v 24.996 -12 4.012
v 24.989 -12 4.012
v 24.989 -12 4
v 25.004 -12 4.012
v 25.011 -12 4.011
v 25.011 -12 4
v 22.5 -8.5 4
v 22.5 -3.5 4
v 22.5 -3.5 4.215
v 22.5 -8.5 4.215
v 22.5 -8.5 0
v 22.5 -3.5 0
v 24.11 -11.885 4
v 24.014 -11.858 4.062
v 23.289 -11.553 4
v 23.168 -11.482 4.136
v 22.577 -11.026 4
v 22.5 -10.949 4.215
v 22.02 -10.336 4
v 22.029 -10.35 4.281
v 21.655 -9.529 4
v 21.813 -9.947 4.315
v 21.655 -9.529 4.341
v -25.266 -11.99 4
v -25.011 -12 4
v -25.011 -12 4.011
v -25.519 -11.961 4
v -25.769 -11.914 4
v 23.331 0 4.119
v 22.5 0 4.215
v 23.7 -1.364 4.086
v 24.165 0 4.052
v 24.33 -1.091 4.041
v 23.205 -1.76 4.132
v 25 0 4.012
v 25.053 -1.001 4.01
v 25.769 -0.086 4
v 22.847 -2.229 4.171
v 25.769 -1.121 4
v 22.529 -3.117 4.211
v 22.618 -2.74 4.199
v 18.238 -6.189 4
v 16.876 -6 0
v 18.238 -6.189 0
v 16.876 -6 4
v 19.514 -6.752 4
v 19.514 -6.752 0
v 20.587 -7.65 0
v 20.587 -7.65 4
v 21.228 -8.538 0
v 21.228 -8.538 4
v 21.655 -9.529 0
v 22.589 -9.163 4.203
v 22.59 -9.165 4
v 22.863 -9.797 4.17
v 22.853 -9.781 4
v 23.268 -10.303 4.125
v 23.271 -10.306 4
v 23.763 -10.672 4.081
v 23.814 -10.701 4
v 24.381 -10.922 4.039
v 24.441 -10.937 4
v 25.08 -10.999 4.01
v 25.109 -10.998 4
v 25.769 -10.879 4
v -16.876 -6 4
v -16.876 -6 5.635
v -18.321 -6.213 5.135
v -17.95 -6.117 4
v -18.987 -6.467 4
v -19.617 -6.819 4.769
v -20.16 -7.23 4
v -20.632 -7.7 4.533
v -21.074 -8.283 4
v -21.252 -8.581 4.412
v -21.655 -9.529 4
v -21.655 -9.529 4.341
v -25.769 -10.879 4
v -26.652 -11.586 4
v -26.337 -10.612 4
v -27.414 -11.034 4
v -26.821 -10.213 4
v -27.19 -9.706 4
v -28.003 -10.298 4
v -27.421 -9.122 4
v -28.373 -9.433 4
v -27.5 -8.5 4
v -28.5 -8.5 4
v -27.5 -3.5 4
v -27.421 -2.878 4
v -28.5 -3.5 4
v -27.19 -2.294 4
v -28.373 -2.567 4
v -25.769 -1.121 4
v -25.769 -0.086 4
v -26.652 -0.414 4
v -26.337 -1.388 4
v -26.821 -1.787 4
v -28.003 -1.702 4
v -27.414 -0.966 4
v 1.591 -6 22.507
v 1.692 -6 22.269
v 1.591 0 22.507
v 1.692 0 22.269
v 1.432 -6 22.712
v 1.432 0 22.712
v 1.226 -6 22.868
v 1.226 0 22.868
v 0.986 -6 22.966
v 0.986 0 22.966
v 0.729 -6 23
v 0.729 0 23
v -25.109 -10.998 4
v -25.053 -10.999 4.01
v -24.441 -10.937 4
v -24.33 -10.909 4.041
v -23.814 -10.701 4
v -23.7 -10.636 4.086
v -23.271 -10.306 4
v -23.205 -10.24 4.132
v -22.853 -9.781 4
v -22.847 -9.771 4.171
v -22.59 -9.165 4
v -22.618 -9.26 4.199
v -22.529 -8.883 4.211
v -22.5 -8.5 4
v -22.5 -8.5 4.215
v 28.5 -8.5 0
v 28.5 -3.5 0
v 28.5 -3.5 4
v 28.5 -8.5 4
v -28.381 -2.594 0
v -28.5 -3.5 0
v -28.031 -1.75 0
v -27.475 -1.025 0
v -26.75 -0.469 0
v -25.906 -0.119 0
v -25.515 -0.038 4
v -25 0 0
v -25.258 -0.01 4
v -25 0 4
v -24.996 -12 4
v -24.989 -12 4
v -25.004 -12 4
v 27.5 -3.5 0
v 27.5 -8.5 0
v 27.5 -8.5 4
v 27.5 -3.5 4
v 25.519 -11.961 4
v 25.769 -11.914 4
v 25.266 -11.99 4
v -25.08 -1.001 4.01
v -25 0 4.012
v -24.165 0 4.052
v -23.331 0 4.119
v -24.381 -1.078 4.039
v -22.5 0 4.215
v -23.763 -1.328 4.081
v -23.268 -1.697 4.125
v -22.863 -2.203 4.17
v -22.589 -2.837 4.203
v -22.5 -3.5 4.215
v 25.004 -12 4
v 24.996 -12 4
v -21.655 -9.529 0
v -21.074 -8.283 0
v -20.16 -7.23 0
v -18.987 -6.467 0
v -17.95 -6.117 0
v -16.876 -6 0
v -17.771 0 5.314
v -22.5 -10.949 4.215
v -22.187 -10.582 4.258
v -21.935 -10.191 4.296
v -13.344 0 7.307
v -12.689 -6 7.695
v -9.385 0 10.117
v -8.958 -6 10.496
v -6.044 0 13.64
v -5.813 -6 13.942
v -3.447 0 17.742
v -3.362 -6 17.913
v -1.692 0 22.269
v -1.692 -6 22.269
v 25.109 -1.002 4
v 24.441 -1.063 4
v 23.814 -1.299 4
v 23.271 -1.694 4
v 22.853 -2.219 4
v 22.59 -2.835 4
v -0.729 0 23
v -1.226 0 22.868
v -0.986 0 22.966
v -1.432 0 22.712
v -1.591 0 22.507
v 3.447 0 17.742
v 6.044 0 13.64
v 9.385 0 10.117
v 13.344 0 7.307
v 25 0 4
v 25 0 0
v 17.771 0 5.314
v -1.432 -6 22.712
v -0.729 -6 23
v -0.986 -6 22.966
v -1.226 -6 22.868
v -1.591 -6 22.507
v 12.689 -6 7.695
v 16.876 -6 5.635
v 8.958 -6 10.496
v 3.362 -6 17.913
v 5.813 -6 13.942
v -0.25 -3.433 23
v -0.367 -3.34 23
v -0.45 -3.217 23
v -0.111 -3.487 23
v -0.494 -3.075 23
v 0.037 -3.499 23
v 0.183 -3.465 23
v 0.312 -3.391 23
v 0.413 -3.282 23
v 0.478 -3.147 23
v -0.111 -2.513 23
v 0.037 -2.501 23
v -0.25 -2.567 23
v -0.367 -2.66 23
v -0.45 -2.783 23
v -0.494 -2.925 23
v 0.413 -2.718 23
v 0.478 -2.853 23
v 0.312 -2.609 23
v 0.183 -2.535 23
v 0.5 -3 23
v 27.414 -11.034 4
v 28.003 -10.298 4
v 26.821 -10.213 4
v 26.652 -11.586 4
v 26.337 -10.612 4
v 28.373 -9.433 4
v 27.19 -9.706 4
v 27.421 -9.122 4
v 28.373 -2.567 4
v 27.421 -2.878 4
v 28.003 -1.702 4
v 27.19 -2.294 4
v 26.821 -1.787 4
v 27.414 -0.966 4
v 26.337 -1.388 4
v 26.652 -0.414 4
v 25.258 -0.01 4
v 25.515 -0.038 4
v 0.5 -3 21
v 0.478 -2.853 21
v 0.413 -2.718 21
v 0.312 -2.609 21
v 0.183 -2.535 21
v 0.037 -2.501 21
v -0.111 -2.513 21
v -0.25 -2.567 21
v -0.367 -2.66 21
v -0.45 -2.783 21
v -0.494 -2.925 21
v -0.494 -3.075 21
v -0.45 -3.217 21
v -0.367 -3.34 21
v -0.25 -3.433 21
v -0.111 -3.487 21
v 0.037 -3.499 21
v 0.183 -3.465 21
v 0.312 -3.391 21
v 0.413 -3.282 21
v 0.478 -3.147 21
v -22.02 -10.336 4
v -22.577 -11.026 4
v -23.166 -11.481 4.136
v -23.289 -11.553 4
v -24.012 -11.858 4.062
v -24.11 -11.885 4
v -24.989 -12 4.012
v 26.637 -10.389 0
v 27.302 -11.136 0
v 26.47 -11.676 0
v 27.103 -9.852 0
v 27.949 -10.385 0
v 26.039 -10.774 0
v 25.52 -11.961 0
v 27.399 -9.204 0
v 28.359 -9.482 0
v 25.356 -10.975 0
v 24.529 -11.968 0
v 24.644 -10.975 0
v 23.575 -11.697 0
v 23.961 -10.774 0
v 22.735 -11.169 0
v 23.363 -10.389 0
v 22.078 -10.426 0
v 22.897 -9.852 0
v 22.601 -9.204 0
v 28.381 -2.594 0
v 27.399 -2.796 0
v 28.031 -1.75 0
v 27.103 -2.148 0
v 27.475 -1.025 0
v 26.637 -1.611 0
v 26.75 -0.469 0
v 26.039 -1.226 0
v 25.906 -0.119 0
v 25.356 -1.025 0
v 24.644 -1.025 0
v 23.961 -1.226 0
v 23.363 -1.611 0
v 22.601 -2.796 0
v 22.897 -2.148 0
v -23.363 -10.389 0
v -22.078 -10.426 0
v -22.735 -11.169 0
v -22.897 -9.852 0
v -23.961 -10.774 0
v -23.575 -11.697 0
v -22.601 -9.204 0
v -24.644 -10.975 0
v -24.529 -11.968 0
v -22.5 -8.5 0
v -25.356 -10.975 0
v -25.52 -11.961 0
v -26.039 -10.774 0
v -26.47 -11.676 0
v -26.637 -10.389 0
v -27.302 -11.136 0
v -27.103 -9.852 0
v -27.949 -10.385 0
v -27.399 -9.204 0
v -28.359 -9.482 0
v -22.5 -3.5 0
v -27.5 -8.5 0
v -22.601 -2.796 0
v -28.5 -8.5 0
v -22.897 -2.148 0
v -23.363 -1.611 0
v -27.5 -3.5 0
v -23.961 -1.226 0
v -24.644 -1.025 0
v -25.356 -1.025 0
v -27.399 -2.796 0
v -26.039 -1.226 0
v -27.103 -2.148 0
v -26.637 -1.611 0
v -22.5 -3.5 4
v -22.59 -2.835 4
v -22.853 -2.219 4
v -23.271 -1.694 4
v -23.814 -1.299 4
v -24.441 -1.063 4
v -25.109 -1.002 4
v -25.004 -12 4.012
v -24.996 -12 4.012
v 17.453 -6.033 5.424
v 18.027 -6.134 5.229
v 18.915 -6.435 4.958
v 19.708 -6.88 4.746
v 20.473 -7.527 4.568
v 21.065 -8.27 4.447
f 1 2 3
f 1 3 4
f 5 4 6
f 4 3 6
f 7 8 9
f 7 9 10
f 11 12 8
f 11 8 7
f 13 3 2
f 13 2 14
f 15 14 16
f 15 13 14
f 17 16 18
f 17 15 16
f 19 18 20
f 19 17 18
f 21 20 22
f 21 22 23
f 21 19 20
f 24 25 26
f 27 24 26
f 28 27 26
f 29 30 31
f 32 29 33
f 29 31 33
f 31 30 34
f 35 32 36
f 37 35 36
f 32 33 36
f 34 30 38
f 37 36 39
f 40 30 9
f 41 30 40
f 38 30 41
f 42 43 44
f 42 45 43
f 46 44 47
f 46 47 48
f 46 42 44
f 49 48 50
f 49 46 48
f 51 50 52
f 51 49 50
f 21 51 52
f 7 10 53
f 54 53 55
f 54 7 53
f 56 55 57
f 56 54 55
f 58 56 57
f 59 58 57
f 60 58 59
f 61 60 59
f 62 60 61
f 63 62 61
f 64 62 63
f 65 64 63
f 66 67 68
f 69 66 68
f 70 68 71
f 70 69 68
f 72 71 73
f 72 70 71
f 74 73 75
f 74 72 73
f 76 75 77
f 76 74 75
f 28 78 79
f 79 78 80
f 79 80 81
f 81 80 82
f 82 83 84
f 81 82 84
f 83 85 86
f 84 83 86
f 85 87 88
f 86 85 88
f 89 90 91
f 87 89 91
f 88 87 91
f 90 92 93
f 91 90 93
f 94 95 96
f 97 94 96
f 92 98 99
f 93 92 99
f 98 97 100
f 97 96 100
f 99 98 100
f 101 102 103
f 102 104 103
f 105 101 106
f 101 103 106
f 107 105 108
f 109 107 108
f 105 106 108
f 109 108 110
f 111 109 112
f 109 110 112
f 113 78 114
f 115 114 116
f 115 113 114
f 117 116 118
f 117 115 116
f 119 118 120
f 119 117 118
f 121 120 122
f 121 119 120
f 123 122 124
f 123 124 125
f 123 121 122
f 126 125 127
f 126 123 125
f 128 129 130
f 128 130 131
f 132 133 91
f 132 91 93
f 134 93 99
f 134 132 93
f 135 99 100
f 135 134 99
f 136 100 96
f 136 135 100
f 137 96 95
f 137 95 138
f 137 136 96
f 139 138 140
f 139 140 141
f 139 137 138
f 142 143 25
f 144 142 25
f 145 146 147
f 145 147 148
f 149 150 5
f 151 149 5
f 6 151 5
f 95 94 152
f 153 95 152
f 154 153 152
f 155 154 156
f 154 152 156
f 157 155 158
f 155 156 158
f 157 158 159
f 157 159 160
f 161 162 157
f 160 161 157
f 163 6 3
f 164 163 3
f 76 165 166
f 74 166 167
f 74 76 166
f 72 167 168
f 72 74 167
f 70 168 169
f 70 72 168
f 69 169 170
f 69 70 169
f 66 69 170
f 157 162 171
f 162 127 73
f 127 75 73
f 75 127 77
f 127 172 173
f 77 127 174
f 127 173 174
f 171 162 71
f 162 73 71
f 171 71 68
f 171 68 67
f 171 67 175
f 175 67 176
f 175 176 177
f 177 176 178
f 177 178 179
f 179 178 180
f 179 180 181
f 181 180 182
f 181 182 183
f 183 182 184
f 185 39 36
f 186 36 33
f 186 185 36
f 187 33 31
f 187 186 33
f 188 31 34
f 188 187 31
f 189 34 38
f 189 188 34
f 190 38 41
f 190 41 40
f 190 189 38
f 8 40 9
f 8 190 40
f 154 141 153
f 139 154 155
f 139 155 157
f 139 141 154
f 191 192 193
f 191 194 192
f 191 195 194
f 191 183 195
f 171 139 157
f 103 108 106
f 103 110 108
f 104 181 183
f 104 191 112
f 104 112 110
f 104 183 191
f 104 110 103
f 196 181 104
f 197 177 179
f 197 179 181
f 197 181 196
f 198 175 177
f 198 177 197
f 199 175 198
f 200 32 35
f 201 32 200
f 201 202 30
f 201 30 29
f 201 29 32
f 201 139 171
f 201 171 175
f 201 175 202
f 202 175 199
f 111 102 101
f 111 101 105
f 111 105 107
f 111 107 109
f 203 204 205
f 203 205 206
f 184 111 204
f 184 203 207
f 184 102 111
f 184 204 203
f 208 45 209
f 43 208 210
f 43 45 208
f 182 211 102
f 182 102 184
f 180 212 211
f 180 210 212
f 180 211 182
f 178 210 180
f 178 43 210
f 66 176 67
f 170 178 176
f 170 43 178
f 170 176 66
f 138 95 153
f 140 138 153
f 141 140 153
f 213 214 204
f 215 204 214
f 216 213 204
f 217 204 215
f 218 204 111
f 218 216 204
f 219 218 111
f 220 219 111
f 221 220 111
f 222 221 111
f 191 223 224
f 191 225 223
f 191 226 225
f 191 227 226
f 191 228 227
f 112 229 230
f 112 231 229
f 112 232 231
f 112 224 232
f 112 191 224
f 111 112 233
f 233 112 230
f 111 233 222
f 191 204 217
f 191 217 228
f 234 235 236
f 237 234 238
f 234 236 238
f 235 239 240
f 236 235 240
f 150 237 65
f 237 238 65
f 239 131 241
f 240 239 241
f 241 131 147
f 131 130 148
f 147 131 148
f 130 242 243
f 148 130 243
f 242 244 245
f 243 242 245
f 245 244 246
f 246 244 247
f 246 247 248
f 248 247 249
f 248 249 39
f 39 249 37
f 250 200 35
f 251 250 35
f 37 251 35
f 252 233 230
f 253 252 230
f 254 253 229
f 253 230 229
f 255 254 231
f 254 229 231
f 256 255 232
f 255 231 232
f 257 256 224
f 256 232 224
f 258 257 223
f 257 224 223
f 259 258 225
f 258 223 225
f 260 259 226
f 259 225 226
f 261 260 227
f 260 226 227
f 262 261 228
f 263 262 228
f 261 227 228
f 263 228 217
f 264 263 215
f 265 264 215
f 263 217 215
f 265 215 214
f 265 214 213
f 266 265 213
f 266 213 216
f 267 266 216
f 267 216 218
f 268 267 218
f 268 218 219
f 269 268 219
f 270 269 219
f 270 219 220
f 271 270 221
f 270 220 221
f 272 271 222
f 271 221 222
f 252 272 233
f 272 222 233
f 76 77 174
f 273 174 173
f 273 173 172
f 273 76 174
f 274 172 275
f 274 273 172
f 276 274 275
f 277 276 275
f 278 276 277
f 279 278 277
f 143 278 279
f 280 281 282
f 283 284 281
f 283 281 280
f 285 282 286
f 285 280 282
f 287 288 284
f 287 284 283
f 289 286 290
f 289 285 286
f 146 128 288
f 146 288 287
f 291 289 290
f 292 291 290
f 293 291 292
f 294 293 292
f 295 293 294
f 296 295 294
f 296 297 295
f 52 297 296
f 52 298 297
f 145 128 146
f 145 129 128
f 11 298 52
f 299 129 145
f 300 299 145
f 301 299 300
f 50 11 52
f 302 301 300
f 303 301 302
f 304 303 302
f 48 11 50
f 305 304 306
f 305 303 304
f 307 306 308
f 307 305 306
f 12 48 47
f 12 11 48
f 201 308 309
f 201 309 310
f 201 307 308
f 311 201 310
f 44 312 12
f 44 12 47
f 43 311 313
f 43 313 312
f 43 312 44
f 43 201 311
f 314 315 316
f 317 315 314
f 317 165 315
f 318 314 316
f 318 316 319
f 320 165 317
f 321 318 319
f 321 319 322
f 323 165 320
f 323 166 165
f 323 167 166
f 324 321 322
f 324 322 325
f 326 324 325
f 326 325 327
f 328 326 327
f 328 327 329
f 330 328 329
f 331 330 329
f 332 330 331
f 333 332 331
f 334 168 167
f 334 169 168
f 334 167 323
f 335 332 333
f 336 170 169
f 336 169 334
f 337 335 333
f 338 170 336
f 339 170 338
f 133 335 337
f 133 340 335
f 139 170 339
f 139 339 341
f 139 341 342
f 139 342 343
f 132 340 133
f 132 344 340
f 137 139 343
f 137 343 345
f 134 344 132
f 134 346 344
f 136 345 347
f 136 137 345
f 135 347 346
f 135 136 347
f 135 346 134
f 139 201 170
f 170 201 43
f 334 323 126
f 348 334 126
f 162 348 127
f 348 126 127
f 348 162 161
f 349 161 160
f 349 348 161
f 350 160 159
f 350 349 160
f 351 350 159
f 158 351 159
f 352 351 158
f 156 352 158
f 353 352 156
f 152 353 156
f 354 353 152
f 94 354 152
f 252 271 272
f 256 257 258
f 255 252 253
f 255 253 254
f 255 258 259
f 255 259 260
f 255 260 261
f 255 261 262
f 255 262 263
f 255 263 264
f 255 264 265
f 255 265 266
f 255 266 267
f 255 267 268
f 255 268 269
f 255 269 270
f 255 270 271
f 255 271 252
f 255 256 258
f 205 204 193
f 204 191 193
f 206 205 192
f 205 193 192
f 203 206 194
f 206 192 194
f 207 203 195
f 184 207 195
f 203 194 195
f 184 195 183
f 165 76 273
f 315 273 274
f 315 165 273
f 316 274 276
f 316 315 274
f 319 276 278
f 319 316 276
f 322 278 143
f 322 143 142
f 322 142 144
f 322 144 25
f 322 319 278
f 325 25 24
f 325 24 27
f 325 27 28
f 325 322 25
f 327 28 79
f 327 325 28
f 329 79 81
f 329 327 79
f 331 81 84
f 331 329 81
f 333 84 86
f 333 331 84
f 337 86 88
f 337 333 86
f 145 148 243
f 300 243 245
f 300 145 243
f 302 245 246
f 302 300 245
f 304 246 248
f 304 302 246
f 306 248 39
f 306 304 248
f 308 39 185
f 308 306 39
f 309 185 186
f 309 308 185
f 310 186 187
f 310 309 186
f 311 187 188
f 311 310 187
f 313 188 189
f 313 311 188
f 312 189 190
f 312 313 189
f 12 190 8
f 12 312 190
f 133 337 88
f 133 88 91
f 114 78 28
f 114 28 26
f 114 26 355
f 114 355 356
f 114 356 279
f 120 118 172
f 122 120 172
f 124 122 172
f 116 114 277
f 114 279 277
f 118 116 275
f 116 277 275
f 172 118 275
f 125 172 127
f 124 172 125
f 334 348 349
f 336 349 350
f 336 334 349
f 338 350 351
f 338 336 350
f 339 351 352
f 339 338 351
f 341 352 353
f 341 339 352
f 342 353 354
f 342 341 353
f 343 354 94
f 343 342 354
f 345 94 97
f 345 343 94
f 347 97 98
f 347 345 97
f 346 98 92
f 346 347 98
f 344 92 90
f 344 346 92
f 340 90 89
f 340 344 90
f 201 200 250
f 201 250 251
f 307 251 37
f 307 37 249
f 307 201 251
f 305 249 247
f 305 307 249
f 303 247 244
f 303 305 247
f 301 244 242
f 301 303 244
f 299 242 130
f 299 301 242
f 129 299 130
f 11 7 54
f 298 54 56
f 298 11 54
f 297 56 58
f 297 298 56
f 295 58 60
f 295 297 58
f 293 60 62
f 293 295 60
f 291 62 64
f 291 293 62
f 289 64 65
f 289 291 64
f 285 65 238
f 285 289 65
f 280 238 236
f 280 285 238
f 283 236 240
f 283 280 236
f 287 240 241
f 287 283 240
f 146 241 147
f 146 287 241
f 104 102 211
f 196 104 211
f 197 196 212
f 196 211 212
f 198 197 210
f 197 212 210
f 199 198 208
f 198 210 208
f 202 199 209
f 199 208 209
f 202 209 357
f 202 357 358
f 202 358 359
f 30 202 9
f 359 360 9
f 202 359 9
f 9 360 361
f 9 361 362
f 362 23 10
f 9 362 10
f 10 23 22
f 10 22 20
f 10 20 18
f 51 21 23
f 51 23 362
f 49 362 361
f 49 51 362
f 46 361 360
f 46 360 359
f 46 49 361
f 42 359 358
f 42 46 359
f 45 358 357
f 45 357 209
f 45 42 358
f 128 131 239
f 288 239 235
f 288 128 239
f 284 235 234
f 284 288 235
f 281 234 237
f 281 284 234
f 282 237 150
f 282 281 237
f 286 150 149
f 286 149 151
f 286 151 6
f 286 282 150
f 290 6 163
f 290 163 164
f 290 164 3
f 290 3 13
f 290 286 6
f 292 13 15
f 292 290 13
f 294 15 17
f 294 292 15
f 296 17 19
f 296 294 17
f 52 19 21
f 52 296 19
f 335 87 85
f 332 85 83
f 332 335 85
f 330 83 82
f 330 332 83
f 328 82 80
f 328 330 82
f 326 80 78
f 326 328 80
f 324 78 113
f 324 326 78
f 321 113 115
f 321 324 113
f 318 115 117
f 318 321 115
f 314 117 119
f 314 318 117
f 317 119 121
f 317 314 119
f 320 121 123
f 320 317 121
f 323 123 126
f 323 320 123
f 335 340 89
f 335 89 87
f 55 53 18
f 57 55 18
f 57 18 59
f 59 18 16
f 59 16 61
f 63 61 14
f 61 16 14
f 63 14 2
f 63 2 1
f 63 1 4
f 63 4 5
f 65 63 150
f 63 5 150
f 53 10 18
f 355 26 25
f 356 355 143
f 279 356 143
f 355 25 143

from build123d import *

# Parameters (mm, degrees)
SALIENTE_EXTRUIR1_DEPTH = 4
REDONDEO1_R             = 5
CROQUIS2_W              = 3
CROQUIS2_H              = 6
SALIENTE_EXTRUIR2_DEPTH = 19
REDONDEO2_START         = -11.5644
REDONDEO2_DEPTH         = 11.5644
REDONDEO2_START_2       = -6
REDONDEO2_2_DEPTH       = 6
REDONDEO2_START_3       = -11.999981249
REDONDEO2_3_DEPTH       = 5.957327692
REDONDEO2_START_4       = 4
REDONDEO2_4_DEPTH       = 20
CROQUIS3_R              = 0.5
CORTAR_EXTRUIR1_DEPTH   = 2
REDONDEO3_R             = 1


with BuildPart() as part:
    # Croquis1 → Saliente-Extruir1 (new body)
    # profile 1 of 4: a face of its own
    with BuildSketch(Plane.XY):
        with BuildLine():
            Line((-21.5, -3.5), (-21.5, -8.5))
            ThreePointArc((-21.5, -8.5), (-25, -12), (-28.5, -8.5))
            Line((-28.5, -8.5), (-28.5, -3.5))
            ThreePointArc((-28.5, -3.5), (-25, 0), (-21.5, -3.5))
        make_face()
        with BuildLine():
            ThreePointArc((-27.5, -8.5), (-25, -11), (-22.5, -8.5))
            Line((-22.5, -8.5), (-22.5, -3.5))
            ThreePointArc((-22.5, -3.5), (-25, -1), (-27.5, -3.5))
            Line((-27.5, -3.5), (-27.5, -8.5))
        make_face(mode=Mode.SUBTRACT)
    # profile 2 of 4: a face of its own
    with BuildSketch(Plane.XY):
        with BuildLine():
            Line((0, 0), (-25, 0))
            ThreePointArc((-25, 0), (-22.525126266, -1.025126266), (-21.5, -3.5))
            Line((-21.5, -3.5), (-21.5, -6))
            Line((-21.5, -6), (0, -6))
            Line((0, -6), (0, 0))
        make_face()
    # profile 3 of 4: a face of its own
    with BuildSketch(Plane.XY):
        with BuildLine():
            Line((25, 0), (0, 0))
            Line((0, 0), (0, -6))
            Line((0, -6), (21.5, -6))
            Line((21.5, -6), (21.5, -3.5))
            ThreePointArc((21.5, -3.5), (22.525126266, -1.025126266), (25, 0))
        make_face()
    # profile 4 of 4: a face of its own
    with BuildSketch(Plane.XY):
        with BuildLine():
            ThreePointArc((28.5, -8.5), (25, -12), (21.5, -8.5))
            Line((21.5, -8.5), (21.5, -3.5))
            ThreePointArc((21.5, -3.5), (25, 0), (28.5, -3.5))
            Line((28.5, -3.5), (28.5, -8.5))
        make_face()
        with BuildLine():
            Line((22.5, -3.5), (22.5, -8.5))
            ThreePointArc((22.5, -8.5), (25, -11), (27.5, -8.5))
            Line((27.5, -8.5), (27.5, -3.5))
            ThreePointArc((27.5, -3.5), (25, -1), (22.5, -3.5))
        make_face(mode=Mode.SUBTRACT)
    extrude(amount=SALIENTE_EXTRUIR1_DEPTH)

    # Redondeo1
    redondeo1_edges = [part.edges().sort_by_distance(p)[0] for p in [
        (21.5, -6, 2),
        (-21.5, -6, 2),
    ]]
    fillet(redondeo1_edges, radius=REDONDEO1_R)

    # Croquis2 → Saliente-Extruir2 (add)
    with BuildSketch(Plane.XY.offset(4)):
        with Locations((0, -3)):
            Rectangle(CROQUIS2_W, CROQUIS2_H)
    extrude(amount=SALIENTE_EXTRUIR2_DEPTH)

    # Redondeo2: read off the stored shape, not the designer's step
    # Redondeo2 outline → Redondeo2 (add)
    with BuildSketch(Plane(origin=(0, 0, 0), x_dir=(1, 0, 0), z_dir=(0, 1, 0)).offset(REDONDEO2_START)):
        with BuildLine():
            ThreePointArc((1.5, -23), (9.10150319, -10.367130938), (22.5, -4.214691199))
            Line((22.5, -4.214691199), (22.5, -4))
            Line((22.5, -4), (1.5, -4))
            Line((1.5, -4), (1.5, -23))
        make_face()
        with BuildLine():
            Line((-22.5, -4), (-22.5, -4.214691199))
            ThreePointArc((-22.5, -4.214691199), (-9.10150319, -10.367130938), (-1.5, -23))
            Line((-1.5, -23), (-1.5, -4))
            Line((-1.5, -4), (-22.5, -4))
        make_face()
    extrude(amount=REDONDEO2_DEPTH)

    # Redondeo2 2 outline → Redondeo2 2 (add)
    with BuildSketch(Plane(origin=(0, 0, 0), x_dir=(1, 0, 0), z_dir=(0, 1, 0)).offset(REDONDEO2_START_2)):
        with BuildLine():
            ThreePointArc((22.5, -4.214691199), (24.131140284, -4.053730539), (25.769322199, -4))
            Line((25.769322199, -4), (22.5, -4))
            Line((22.5, -4), (22.5, -4.214691199))
        make_face()
        with BuildLine():
            Line((-22.5, -4), (-25.769322199, -4))
            ThreePointArc((-25.769322199, -4), (-24.131140284, -4.053730539), (-22.5, -4.214691199))
            Line((-22.5, -4.214691199), (-22.5, -4))
        make_face()
    extrude(amount=REDONDEO2_2_DEPTH)

    # Redondeo2 3 outline → Redondeo2 3 (add)
    with BuildSketch(Plane(origin=(0, 0, 0), x_dir=(1, 0, 0), z_dir=(0, 1, 0)).offset(REDONDEO2_START_3)):
        with BuildLine():
            ThreePointArc((22.5, -4.214691199), (24.131140284, -4.053730539), (25.769322199, -4))
            Line((25.769322199, -4), (22.5, -4))
            Line((22.5, -4), (22.5, -4.214691199))
        make_face()
        with BuildLine():
            Line((-22.5, -4), (-25.769322199, -4))
            ThreePointArc((-25.769322199, -4), (-24.131140284, -4.053730539), (-22.5, -4.214691199))
            Line((-22.5, -4.214691199), (-22.5, -4))
        make_face()
    extrude(amount=REDONDEO2_3_DEPTH)

    # Redondeo2 4 outline → Redondeo2 4 (cut)
    with BuildSketch(Plane.XY.offset(REDONDEO2_START_4)):
        with BuildLine():
            Line((-24.988543271, -11.999981249), (-22.5, -11.999981249))
            Line((-22.5, -11.999981249), (-22.5, -11.5644))
            Line((-22.5, -11.5644), (-1.5, -11.5644))
            Line((-1.5, -11.5644), (-1.5, -6))
            Line((-1.5, -6), (-16.875961595, -6))
            ThreePointArc((-16.875961595, -6), (-19.846404224, -6.978001667), (-21.654807716, -9.529411765))
            ThreePointArc((-21.654807716, -9.529411765), (-22.916085044, -11.311991902), (-24.988543271, -11.999981249))
        make_face()
        with BuildLine():
            Line((-25.769322199, -11.999981249), (-25.011456729, -11.999981249))
            ThreePointArc((-25.011456729, -11.999981249), (-25.392727477, -11.977896653), (-25.769322199, -11.914402342))
            Line((-25.769322199, -11.914402342), (-25.769322199, -11.999981249))
        make_face()
        with BuildLine():
            Line((22.5, -6), (25.769322199, -6))
            Line((25.769322199, -6), (25.769322199, -1.121314785))
            ThreePointArc((25.769322199, -1.121314785), (23.529167837, -1.478452882), (22.5, -3.5))
            Line((22.5, -3.5), (22.5, -6))
        make_face()
        with BuildLine():
            ThreePointArc((22.5, -8.5), (23.529167837, -10.521547118), (25.769322199, -10.878685215))
            Line((25.769322199, -10.878685215), (25.769322199, -6.042653557))
            Line((25.769322199, -6.042653557), (22.5, -6.042653557))
            Line((22.5, -6.042653557), (22.5, -8.5))
        make_face()
        with BuildLine():
            Line((25.011456729, -11.999981249), (25.769322199, -11.999981249))
            Line((25.769322199, -11.999981249), (25.769322199, -11.914402342))
            ThreePointArc((25.769322199, -11.914402342), (25.392727477, -11.977896653), (25.011456729, -11.999981249))
        make_face()
        with BuildLine():
            Line((1.5, -11.5644), (22.5, -11.5644))
            Line((22.5, -11.5644), (22.5, -11.999981249))
            Line((22.5, -11.999981249), (24.988543271, -11.999981249))
            ThreePointArc((24.988543271, -11.999981249), (22.916085044, -11.311991902), (21.654807716, -9.529411765))
            ThreePointArc((21.654807716, -9.529411765), (19.846404224, -6.978001667), (16.875961595, -6))
            Line((16.875961595, -6), (1.5, -6))
            Line((1.5, -6), (1.5, -11.5644))
        make_face()
        with BuildLine():
            ThreePointArc((25, 0), (25.387034755, -0.021465237), (25.769322199, -0.085597658))
            Line((25.769322199, -0.085597658), (25.769322199, 0))
            Line((25.769322199, 0), (25, 0))
        make_face()
        with BuildLine():
            ThreePointArc((-25.769322199, -10.878685215), (-23.529167837, -10.521547118), (-22.5, -8.5))
            Line((-22.5, -8.5), (-22.5, -6.042653557))
            Line((-22.5, -6.042653557), (-25.769322199, -6.042653557))
            Line((-25.769322199, -6.042653557), (-25.769322199, -10.878685215))
        make_face()
        with BuildLine():
            ThreePointArc((-25.769322199, -0.085597658), (-25.387034755, -0.021465237), (-25, 0))
            Line((-25, 0), (-25.769322199, 0))
            Line((-25.769322199, 0), (-25.769322199, -0.085597658))
        make_face()
        with BuildLine():
            Line((-25.769322199, -6), (-22.5, -6))
            Line((-22.5, -6), (-22.5, -3.5))
            ThreePointArc((-22.5, -3.5), (-23.529167837, -1.478452882), (-25.769322199, -1.121314785))
            Line((-25.769322199, -1.121314785), (-25.769322199, -6))
        make_face()
    extrude(amount=REDONDEO2_4_DEPTH, mode=Mode.SUBTRACT)

    # Croquis3 → Cortar-Extruir1 (cut)
    with BuildSketch(Plane.XY.offset(23)):
        with Locations((0, -3)):
            Circle(CROQUIS3_R)
    extrude(amount=-CORTAR_EXTRUIR1_DEPTH, mode=Mode.SUBTRACT)

    # Redondeo3
    redondeo3_edges = [part.edges().sort_by_distance(p)[0] for p in [
        (-1.5, -3, 23),
        (1.5, -3, 23),
    ]]
    fillet(redondeo3_edges, radius=REDONDEO3_R)


solid = part.part
